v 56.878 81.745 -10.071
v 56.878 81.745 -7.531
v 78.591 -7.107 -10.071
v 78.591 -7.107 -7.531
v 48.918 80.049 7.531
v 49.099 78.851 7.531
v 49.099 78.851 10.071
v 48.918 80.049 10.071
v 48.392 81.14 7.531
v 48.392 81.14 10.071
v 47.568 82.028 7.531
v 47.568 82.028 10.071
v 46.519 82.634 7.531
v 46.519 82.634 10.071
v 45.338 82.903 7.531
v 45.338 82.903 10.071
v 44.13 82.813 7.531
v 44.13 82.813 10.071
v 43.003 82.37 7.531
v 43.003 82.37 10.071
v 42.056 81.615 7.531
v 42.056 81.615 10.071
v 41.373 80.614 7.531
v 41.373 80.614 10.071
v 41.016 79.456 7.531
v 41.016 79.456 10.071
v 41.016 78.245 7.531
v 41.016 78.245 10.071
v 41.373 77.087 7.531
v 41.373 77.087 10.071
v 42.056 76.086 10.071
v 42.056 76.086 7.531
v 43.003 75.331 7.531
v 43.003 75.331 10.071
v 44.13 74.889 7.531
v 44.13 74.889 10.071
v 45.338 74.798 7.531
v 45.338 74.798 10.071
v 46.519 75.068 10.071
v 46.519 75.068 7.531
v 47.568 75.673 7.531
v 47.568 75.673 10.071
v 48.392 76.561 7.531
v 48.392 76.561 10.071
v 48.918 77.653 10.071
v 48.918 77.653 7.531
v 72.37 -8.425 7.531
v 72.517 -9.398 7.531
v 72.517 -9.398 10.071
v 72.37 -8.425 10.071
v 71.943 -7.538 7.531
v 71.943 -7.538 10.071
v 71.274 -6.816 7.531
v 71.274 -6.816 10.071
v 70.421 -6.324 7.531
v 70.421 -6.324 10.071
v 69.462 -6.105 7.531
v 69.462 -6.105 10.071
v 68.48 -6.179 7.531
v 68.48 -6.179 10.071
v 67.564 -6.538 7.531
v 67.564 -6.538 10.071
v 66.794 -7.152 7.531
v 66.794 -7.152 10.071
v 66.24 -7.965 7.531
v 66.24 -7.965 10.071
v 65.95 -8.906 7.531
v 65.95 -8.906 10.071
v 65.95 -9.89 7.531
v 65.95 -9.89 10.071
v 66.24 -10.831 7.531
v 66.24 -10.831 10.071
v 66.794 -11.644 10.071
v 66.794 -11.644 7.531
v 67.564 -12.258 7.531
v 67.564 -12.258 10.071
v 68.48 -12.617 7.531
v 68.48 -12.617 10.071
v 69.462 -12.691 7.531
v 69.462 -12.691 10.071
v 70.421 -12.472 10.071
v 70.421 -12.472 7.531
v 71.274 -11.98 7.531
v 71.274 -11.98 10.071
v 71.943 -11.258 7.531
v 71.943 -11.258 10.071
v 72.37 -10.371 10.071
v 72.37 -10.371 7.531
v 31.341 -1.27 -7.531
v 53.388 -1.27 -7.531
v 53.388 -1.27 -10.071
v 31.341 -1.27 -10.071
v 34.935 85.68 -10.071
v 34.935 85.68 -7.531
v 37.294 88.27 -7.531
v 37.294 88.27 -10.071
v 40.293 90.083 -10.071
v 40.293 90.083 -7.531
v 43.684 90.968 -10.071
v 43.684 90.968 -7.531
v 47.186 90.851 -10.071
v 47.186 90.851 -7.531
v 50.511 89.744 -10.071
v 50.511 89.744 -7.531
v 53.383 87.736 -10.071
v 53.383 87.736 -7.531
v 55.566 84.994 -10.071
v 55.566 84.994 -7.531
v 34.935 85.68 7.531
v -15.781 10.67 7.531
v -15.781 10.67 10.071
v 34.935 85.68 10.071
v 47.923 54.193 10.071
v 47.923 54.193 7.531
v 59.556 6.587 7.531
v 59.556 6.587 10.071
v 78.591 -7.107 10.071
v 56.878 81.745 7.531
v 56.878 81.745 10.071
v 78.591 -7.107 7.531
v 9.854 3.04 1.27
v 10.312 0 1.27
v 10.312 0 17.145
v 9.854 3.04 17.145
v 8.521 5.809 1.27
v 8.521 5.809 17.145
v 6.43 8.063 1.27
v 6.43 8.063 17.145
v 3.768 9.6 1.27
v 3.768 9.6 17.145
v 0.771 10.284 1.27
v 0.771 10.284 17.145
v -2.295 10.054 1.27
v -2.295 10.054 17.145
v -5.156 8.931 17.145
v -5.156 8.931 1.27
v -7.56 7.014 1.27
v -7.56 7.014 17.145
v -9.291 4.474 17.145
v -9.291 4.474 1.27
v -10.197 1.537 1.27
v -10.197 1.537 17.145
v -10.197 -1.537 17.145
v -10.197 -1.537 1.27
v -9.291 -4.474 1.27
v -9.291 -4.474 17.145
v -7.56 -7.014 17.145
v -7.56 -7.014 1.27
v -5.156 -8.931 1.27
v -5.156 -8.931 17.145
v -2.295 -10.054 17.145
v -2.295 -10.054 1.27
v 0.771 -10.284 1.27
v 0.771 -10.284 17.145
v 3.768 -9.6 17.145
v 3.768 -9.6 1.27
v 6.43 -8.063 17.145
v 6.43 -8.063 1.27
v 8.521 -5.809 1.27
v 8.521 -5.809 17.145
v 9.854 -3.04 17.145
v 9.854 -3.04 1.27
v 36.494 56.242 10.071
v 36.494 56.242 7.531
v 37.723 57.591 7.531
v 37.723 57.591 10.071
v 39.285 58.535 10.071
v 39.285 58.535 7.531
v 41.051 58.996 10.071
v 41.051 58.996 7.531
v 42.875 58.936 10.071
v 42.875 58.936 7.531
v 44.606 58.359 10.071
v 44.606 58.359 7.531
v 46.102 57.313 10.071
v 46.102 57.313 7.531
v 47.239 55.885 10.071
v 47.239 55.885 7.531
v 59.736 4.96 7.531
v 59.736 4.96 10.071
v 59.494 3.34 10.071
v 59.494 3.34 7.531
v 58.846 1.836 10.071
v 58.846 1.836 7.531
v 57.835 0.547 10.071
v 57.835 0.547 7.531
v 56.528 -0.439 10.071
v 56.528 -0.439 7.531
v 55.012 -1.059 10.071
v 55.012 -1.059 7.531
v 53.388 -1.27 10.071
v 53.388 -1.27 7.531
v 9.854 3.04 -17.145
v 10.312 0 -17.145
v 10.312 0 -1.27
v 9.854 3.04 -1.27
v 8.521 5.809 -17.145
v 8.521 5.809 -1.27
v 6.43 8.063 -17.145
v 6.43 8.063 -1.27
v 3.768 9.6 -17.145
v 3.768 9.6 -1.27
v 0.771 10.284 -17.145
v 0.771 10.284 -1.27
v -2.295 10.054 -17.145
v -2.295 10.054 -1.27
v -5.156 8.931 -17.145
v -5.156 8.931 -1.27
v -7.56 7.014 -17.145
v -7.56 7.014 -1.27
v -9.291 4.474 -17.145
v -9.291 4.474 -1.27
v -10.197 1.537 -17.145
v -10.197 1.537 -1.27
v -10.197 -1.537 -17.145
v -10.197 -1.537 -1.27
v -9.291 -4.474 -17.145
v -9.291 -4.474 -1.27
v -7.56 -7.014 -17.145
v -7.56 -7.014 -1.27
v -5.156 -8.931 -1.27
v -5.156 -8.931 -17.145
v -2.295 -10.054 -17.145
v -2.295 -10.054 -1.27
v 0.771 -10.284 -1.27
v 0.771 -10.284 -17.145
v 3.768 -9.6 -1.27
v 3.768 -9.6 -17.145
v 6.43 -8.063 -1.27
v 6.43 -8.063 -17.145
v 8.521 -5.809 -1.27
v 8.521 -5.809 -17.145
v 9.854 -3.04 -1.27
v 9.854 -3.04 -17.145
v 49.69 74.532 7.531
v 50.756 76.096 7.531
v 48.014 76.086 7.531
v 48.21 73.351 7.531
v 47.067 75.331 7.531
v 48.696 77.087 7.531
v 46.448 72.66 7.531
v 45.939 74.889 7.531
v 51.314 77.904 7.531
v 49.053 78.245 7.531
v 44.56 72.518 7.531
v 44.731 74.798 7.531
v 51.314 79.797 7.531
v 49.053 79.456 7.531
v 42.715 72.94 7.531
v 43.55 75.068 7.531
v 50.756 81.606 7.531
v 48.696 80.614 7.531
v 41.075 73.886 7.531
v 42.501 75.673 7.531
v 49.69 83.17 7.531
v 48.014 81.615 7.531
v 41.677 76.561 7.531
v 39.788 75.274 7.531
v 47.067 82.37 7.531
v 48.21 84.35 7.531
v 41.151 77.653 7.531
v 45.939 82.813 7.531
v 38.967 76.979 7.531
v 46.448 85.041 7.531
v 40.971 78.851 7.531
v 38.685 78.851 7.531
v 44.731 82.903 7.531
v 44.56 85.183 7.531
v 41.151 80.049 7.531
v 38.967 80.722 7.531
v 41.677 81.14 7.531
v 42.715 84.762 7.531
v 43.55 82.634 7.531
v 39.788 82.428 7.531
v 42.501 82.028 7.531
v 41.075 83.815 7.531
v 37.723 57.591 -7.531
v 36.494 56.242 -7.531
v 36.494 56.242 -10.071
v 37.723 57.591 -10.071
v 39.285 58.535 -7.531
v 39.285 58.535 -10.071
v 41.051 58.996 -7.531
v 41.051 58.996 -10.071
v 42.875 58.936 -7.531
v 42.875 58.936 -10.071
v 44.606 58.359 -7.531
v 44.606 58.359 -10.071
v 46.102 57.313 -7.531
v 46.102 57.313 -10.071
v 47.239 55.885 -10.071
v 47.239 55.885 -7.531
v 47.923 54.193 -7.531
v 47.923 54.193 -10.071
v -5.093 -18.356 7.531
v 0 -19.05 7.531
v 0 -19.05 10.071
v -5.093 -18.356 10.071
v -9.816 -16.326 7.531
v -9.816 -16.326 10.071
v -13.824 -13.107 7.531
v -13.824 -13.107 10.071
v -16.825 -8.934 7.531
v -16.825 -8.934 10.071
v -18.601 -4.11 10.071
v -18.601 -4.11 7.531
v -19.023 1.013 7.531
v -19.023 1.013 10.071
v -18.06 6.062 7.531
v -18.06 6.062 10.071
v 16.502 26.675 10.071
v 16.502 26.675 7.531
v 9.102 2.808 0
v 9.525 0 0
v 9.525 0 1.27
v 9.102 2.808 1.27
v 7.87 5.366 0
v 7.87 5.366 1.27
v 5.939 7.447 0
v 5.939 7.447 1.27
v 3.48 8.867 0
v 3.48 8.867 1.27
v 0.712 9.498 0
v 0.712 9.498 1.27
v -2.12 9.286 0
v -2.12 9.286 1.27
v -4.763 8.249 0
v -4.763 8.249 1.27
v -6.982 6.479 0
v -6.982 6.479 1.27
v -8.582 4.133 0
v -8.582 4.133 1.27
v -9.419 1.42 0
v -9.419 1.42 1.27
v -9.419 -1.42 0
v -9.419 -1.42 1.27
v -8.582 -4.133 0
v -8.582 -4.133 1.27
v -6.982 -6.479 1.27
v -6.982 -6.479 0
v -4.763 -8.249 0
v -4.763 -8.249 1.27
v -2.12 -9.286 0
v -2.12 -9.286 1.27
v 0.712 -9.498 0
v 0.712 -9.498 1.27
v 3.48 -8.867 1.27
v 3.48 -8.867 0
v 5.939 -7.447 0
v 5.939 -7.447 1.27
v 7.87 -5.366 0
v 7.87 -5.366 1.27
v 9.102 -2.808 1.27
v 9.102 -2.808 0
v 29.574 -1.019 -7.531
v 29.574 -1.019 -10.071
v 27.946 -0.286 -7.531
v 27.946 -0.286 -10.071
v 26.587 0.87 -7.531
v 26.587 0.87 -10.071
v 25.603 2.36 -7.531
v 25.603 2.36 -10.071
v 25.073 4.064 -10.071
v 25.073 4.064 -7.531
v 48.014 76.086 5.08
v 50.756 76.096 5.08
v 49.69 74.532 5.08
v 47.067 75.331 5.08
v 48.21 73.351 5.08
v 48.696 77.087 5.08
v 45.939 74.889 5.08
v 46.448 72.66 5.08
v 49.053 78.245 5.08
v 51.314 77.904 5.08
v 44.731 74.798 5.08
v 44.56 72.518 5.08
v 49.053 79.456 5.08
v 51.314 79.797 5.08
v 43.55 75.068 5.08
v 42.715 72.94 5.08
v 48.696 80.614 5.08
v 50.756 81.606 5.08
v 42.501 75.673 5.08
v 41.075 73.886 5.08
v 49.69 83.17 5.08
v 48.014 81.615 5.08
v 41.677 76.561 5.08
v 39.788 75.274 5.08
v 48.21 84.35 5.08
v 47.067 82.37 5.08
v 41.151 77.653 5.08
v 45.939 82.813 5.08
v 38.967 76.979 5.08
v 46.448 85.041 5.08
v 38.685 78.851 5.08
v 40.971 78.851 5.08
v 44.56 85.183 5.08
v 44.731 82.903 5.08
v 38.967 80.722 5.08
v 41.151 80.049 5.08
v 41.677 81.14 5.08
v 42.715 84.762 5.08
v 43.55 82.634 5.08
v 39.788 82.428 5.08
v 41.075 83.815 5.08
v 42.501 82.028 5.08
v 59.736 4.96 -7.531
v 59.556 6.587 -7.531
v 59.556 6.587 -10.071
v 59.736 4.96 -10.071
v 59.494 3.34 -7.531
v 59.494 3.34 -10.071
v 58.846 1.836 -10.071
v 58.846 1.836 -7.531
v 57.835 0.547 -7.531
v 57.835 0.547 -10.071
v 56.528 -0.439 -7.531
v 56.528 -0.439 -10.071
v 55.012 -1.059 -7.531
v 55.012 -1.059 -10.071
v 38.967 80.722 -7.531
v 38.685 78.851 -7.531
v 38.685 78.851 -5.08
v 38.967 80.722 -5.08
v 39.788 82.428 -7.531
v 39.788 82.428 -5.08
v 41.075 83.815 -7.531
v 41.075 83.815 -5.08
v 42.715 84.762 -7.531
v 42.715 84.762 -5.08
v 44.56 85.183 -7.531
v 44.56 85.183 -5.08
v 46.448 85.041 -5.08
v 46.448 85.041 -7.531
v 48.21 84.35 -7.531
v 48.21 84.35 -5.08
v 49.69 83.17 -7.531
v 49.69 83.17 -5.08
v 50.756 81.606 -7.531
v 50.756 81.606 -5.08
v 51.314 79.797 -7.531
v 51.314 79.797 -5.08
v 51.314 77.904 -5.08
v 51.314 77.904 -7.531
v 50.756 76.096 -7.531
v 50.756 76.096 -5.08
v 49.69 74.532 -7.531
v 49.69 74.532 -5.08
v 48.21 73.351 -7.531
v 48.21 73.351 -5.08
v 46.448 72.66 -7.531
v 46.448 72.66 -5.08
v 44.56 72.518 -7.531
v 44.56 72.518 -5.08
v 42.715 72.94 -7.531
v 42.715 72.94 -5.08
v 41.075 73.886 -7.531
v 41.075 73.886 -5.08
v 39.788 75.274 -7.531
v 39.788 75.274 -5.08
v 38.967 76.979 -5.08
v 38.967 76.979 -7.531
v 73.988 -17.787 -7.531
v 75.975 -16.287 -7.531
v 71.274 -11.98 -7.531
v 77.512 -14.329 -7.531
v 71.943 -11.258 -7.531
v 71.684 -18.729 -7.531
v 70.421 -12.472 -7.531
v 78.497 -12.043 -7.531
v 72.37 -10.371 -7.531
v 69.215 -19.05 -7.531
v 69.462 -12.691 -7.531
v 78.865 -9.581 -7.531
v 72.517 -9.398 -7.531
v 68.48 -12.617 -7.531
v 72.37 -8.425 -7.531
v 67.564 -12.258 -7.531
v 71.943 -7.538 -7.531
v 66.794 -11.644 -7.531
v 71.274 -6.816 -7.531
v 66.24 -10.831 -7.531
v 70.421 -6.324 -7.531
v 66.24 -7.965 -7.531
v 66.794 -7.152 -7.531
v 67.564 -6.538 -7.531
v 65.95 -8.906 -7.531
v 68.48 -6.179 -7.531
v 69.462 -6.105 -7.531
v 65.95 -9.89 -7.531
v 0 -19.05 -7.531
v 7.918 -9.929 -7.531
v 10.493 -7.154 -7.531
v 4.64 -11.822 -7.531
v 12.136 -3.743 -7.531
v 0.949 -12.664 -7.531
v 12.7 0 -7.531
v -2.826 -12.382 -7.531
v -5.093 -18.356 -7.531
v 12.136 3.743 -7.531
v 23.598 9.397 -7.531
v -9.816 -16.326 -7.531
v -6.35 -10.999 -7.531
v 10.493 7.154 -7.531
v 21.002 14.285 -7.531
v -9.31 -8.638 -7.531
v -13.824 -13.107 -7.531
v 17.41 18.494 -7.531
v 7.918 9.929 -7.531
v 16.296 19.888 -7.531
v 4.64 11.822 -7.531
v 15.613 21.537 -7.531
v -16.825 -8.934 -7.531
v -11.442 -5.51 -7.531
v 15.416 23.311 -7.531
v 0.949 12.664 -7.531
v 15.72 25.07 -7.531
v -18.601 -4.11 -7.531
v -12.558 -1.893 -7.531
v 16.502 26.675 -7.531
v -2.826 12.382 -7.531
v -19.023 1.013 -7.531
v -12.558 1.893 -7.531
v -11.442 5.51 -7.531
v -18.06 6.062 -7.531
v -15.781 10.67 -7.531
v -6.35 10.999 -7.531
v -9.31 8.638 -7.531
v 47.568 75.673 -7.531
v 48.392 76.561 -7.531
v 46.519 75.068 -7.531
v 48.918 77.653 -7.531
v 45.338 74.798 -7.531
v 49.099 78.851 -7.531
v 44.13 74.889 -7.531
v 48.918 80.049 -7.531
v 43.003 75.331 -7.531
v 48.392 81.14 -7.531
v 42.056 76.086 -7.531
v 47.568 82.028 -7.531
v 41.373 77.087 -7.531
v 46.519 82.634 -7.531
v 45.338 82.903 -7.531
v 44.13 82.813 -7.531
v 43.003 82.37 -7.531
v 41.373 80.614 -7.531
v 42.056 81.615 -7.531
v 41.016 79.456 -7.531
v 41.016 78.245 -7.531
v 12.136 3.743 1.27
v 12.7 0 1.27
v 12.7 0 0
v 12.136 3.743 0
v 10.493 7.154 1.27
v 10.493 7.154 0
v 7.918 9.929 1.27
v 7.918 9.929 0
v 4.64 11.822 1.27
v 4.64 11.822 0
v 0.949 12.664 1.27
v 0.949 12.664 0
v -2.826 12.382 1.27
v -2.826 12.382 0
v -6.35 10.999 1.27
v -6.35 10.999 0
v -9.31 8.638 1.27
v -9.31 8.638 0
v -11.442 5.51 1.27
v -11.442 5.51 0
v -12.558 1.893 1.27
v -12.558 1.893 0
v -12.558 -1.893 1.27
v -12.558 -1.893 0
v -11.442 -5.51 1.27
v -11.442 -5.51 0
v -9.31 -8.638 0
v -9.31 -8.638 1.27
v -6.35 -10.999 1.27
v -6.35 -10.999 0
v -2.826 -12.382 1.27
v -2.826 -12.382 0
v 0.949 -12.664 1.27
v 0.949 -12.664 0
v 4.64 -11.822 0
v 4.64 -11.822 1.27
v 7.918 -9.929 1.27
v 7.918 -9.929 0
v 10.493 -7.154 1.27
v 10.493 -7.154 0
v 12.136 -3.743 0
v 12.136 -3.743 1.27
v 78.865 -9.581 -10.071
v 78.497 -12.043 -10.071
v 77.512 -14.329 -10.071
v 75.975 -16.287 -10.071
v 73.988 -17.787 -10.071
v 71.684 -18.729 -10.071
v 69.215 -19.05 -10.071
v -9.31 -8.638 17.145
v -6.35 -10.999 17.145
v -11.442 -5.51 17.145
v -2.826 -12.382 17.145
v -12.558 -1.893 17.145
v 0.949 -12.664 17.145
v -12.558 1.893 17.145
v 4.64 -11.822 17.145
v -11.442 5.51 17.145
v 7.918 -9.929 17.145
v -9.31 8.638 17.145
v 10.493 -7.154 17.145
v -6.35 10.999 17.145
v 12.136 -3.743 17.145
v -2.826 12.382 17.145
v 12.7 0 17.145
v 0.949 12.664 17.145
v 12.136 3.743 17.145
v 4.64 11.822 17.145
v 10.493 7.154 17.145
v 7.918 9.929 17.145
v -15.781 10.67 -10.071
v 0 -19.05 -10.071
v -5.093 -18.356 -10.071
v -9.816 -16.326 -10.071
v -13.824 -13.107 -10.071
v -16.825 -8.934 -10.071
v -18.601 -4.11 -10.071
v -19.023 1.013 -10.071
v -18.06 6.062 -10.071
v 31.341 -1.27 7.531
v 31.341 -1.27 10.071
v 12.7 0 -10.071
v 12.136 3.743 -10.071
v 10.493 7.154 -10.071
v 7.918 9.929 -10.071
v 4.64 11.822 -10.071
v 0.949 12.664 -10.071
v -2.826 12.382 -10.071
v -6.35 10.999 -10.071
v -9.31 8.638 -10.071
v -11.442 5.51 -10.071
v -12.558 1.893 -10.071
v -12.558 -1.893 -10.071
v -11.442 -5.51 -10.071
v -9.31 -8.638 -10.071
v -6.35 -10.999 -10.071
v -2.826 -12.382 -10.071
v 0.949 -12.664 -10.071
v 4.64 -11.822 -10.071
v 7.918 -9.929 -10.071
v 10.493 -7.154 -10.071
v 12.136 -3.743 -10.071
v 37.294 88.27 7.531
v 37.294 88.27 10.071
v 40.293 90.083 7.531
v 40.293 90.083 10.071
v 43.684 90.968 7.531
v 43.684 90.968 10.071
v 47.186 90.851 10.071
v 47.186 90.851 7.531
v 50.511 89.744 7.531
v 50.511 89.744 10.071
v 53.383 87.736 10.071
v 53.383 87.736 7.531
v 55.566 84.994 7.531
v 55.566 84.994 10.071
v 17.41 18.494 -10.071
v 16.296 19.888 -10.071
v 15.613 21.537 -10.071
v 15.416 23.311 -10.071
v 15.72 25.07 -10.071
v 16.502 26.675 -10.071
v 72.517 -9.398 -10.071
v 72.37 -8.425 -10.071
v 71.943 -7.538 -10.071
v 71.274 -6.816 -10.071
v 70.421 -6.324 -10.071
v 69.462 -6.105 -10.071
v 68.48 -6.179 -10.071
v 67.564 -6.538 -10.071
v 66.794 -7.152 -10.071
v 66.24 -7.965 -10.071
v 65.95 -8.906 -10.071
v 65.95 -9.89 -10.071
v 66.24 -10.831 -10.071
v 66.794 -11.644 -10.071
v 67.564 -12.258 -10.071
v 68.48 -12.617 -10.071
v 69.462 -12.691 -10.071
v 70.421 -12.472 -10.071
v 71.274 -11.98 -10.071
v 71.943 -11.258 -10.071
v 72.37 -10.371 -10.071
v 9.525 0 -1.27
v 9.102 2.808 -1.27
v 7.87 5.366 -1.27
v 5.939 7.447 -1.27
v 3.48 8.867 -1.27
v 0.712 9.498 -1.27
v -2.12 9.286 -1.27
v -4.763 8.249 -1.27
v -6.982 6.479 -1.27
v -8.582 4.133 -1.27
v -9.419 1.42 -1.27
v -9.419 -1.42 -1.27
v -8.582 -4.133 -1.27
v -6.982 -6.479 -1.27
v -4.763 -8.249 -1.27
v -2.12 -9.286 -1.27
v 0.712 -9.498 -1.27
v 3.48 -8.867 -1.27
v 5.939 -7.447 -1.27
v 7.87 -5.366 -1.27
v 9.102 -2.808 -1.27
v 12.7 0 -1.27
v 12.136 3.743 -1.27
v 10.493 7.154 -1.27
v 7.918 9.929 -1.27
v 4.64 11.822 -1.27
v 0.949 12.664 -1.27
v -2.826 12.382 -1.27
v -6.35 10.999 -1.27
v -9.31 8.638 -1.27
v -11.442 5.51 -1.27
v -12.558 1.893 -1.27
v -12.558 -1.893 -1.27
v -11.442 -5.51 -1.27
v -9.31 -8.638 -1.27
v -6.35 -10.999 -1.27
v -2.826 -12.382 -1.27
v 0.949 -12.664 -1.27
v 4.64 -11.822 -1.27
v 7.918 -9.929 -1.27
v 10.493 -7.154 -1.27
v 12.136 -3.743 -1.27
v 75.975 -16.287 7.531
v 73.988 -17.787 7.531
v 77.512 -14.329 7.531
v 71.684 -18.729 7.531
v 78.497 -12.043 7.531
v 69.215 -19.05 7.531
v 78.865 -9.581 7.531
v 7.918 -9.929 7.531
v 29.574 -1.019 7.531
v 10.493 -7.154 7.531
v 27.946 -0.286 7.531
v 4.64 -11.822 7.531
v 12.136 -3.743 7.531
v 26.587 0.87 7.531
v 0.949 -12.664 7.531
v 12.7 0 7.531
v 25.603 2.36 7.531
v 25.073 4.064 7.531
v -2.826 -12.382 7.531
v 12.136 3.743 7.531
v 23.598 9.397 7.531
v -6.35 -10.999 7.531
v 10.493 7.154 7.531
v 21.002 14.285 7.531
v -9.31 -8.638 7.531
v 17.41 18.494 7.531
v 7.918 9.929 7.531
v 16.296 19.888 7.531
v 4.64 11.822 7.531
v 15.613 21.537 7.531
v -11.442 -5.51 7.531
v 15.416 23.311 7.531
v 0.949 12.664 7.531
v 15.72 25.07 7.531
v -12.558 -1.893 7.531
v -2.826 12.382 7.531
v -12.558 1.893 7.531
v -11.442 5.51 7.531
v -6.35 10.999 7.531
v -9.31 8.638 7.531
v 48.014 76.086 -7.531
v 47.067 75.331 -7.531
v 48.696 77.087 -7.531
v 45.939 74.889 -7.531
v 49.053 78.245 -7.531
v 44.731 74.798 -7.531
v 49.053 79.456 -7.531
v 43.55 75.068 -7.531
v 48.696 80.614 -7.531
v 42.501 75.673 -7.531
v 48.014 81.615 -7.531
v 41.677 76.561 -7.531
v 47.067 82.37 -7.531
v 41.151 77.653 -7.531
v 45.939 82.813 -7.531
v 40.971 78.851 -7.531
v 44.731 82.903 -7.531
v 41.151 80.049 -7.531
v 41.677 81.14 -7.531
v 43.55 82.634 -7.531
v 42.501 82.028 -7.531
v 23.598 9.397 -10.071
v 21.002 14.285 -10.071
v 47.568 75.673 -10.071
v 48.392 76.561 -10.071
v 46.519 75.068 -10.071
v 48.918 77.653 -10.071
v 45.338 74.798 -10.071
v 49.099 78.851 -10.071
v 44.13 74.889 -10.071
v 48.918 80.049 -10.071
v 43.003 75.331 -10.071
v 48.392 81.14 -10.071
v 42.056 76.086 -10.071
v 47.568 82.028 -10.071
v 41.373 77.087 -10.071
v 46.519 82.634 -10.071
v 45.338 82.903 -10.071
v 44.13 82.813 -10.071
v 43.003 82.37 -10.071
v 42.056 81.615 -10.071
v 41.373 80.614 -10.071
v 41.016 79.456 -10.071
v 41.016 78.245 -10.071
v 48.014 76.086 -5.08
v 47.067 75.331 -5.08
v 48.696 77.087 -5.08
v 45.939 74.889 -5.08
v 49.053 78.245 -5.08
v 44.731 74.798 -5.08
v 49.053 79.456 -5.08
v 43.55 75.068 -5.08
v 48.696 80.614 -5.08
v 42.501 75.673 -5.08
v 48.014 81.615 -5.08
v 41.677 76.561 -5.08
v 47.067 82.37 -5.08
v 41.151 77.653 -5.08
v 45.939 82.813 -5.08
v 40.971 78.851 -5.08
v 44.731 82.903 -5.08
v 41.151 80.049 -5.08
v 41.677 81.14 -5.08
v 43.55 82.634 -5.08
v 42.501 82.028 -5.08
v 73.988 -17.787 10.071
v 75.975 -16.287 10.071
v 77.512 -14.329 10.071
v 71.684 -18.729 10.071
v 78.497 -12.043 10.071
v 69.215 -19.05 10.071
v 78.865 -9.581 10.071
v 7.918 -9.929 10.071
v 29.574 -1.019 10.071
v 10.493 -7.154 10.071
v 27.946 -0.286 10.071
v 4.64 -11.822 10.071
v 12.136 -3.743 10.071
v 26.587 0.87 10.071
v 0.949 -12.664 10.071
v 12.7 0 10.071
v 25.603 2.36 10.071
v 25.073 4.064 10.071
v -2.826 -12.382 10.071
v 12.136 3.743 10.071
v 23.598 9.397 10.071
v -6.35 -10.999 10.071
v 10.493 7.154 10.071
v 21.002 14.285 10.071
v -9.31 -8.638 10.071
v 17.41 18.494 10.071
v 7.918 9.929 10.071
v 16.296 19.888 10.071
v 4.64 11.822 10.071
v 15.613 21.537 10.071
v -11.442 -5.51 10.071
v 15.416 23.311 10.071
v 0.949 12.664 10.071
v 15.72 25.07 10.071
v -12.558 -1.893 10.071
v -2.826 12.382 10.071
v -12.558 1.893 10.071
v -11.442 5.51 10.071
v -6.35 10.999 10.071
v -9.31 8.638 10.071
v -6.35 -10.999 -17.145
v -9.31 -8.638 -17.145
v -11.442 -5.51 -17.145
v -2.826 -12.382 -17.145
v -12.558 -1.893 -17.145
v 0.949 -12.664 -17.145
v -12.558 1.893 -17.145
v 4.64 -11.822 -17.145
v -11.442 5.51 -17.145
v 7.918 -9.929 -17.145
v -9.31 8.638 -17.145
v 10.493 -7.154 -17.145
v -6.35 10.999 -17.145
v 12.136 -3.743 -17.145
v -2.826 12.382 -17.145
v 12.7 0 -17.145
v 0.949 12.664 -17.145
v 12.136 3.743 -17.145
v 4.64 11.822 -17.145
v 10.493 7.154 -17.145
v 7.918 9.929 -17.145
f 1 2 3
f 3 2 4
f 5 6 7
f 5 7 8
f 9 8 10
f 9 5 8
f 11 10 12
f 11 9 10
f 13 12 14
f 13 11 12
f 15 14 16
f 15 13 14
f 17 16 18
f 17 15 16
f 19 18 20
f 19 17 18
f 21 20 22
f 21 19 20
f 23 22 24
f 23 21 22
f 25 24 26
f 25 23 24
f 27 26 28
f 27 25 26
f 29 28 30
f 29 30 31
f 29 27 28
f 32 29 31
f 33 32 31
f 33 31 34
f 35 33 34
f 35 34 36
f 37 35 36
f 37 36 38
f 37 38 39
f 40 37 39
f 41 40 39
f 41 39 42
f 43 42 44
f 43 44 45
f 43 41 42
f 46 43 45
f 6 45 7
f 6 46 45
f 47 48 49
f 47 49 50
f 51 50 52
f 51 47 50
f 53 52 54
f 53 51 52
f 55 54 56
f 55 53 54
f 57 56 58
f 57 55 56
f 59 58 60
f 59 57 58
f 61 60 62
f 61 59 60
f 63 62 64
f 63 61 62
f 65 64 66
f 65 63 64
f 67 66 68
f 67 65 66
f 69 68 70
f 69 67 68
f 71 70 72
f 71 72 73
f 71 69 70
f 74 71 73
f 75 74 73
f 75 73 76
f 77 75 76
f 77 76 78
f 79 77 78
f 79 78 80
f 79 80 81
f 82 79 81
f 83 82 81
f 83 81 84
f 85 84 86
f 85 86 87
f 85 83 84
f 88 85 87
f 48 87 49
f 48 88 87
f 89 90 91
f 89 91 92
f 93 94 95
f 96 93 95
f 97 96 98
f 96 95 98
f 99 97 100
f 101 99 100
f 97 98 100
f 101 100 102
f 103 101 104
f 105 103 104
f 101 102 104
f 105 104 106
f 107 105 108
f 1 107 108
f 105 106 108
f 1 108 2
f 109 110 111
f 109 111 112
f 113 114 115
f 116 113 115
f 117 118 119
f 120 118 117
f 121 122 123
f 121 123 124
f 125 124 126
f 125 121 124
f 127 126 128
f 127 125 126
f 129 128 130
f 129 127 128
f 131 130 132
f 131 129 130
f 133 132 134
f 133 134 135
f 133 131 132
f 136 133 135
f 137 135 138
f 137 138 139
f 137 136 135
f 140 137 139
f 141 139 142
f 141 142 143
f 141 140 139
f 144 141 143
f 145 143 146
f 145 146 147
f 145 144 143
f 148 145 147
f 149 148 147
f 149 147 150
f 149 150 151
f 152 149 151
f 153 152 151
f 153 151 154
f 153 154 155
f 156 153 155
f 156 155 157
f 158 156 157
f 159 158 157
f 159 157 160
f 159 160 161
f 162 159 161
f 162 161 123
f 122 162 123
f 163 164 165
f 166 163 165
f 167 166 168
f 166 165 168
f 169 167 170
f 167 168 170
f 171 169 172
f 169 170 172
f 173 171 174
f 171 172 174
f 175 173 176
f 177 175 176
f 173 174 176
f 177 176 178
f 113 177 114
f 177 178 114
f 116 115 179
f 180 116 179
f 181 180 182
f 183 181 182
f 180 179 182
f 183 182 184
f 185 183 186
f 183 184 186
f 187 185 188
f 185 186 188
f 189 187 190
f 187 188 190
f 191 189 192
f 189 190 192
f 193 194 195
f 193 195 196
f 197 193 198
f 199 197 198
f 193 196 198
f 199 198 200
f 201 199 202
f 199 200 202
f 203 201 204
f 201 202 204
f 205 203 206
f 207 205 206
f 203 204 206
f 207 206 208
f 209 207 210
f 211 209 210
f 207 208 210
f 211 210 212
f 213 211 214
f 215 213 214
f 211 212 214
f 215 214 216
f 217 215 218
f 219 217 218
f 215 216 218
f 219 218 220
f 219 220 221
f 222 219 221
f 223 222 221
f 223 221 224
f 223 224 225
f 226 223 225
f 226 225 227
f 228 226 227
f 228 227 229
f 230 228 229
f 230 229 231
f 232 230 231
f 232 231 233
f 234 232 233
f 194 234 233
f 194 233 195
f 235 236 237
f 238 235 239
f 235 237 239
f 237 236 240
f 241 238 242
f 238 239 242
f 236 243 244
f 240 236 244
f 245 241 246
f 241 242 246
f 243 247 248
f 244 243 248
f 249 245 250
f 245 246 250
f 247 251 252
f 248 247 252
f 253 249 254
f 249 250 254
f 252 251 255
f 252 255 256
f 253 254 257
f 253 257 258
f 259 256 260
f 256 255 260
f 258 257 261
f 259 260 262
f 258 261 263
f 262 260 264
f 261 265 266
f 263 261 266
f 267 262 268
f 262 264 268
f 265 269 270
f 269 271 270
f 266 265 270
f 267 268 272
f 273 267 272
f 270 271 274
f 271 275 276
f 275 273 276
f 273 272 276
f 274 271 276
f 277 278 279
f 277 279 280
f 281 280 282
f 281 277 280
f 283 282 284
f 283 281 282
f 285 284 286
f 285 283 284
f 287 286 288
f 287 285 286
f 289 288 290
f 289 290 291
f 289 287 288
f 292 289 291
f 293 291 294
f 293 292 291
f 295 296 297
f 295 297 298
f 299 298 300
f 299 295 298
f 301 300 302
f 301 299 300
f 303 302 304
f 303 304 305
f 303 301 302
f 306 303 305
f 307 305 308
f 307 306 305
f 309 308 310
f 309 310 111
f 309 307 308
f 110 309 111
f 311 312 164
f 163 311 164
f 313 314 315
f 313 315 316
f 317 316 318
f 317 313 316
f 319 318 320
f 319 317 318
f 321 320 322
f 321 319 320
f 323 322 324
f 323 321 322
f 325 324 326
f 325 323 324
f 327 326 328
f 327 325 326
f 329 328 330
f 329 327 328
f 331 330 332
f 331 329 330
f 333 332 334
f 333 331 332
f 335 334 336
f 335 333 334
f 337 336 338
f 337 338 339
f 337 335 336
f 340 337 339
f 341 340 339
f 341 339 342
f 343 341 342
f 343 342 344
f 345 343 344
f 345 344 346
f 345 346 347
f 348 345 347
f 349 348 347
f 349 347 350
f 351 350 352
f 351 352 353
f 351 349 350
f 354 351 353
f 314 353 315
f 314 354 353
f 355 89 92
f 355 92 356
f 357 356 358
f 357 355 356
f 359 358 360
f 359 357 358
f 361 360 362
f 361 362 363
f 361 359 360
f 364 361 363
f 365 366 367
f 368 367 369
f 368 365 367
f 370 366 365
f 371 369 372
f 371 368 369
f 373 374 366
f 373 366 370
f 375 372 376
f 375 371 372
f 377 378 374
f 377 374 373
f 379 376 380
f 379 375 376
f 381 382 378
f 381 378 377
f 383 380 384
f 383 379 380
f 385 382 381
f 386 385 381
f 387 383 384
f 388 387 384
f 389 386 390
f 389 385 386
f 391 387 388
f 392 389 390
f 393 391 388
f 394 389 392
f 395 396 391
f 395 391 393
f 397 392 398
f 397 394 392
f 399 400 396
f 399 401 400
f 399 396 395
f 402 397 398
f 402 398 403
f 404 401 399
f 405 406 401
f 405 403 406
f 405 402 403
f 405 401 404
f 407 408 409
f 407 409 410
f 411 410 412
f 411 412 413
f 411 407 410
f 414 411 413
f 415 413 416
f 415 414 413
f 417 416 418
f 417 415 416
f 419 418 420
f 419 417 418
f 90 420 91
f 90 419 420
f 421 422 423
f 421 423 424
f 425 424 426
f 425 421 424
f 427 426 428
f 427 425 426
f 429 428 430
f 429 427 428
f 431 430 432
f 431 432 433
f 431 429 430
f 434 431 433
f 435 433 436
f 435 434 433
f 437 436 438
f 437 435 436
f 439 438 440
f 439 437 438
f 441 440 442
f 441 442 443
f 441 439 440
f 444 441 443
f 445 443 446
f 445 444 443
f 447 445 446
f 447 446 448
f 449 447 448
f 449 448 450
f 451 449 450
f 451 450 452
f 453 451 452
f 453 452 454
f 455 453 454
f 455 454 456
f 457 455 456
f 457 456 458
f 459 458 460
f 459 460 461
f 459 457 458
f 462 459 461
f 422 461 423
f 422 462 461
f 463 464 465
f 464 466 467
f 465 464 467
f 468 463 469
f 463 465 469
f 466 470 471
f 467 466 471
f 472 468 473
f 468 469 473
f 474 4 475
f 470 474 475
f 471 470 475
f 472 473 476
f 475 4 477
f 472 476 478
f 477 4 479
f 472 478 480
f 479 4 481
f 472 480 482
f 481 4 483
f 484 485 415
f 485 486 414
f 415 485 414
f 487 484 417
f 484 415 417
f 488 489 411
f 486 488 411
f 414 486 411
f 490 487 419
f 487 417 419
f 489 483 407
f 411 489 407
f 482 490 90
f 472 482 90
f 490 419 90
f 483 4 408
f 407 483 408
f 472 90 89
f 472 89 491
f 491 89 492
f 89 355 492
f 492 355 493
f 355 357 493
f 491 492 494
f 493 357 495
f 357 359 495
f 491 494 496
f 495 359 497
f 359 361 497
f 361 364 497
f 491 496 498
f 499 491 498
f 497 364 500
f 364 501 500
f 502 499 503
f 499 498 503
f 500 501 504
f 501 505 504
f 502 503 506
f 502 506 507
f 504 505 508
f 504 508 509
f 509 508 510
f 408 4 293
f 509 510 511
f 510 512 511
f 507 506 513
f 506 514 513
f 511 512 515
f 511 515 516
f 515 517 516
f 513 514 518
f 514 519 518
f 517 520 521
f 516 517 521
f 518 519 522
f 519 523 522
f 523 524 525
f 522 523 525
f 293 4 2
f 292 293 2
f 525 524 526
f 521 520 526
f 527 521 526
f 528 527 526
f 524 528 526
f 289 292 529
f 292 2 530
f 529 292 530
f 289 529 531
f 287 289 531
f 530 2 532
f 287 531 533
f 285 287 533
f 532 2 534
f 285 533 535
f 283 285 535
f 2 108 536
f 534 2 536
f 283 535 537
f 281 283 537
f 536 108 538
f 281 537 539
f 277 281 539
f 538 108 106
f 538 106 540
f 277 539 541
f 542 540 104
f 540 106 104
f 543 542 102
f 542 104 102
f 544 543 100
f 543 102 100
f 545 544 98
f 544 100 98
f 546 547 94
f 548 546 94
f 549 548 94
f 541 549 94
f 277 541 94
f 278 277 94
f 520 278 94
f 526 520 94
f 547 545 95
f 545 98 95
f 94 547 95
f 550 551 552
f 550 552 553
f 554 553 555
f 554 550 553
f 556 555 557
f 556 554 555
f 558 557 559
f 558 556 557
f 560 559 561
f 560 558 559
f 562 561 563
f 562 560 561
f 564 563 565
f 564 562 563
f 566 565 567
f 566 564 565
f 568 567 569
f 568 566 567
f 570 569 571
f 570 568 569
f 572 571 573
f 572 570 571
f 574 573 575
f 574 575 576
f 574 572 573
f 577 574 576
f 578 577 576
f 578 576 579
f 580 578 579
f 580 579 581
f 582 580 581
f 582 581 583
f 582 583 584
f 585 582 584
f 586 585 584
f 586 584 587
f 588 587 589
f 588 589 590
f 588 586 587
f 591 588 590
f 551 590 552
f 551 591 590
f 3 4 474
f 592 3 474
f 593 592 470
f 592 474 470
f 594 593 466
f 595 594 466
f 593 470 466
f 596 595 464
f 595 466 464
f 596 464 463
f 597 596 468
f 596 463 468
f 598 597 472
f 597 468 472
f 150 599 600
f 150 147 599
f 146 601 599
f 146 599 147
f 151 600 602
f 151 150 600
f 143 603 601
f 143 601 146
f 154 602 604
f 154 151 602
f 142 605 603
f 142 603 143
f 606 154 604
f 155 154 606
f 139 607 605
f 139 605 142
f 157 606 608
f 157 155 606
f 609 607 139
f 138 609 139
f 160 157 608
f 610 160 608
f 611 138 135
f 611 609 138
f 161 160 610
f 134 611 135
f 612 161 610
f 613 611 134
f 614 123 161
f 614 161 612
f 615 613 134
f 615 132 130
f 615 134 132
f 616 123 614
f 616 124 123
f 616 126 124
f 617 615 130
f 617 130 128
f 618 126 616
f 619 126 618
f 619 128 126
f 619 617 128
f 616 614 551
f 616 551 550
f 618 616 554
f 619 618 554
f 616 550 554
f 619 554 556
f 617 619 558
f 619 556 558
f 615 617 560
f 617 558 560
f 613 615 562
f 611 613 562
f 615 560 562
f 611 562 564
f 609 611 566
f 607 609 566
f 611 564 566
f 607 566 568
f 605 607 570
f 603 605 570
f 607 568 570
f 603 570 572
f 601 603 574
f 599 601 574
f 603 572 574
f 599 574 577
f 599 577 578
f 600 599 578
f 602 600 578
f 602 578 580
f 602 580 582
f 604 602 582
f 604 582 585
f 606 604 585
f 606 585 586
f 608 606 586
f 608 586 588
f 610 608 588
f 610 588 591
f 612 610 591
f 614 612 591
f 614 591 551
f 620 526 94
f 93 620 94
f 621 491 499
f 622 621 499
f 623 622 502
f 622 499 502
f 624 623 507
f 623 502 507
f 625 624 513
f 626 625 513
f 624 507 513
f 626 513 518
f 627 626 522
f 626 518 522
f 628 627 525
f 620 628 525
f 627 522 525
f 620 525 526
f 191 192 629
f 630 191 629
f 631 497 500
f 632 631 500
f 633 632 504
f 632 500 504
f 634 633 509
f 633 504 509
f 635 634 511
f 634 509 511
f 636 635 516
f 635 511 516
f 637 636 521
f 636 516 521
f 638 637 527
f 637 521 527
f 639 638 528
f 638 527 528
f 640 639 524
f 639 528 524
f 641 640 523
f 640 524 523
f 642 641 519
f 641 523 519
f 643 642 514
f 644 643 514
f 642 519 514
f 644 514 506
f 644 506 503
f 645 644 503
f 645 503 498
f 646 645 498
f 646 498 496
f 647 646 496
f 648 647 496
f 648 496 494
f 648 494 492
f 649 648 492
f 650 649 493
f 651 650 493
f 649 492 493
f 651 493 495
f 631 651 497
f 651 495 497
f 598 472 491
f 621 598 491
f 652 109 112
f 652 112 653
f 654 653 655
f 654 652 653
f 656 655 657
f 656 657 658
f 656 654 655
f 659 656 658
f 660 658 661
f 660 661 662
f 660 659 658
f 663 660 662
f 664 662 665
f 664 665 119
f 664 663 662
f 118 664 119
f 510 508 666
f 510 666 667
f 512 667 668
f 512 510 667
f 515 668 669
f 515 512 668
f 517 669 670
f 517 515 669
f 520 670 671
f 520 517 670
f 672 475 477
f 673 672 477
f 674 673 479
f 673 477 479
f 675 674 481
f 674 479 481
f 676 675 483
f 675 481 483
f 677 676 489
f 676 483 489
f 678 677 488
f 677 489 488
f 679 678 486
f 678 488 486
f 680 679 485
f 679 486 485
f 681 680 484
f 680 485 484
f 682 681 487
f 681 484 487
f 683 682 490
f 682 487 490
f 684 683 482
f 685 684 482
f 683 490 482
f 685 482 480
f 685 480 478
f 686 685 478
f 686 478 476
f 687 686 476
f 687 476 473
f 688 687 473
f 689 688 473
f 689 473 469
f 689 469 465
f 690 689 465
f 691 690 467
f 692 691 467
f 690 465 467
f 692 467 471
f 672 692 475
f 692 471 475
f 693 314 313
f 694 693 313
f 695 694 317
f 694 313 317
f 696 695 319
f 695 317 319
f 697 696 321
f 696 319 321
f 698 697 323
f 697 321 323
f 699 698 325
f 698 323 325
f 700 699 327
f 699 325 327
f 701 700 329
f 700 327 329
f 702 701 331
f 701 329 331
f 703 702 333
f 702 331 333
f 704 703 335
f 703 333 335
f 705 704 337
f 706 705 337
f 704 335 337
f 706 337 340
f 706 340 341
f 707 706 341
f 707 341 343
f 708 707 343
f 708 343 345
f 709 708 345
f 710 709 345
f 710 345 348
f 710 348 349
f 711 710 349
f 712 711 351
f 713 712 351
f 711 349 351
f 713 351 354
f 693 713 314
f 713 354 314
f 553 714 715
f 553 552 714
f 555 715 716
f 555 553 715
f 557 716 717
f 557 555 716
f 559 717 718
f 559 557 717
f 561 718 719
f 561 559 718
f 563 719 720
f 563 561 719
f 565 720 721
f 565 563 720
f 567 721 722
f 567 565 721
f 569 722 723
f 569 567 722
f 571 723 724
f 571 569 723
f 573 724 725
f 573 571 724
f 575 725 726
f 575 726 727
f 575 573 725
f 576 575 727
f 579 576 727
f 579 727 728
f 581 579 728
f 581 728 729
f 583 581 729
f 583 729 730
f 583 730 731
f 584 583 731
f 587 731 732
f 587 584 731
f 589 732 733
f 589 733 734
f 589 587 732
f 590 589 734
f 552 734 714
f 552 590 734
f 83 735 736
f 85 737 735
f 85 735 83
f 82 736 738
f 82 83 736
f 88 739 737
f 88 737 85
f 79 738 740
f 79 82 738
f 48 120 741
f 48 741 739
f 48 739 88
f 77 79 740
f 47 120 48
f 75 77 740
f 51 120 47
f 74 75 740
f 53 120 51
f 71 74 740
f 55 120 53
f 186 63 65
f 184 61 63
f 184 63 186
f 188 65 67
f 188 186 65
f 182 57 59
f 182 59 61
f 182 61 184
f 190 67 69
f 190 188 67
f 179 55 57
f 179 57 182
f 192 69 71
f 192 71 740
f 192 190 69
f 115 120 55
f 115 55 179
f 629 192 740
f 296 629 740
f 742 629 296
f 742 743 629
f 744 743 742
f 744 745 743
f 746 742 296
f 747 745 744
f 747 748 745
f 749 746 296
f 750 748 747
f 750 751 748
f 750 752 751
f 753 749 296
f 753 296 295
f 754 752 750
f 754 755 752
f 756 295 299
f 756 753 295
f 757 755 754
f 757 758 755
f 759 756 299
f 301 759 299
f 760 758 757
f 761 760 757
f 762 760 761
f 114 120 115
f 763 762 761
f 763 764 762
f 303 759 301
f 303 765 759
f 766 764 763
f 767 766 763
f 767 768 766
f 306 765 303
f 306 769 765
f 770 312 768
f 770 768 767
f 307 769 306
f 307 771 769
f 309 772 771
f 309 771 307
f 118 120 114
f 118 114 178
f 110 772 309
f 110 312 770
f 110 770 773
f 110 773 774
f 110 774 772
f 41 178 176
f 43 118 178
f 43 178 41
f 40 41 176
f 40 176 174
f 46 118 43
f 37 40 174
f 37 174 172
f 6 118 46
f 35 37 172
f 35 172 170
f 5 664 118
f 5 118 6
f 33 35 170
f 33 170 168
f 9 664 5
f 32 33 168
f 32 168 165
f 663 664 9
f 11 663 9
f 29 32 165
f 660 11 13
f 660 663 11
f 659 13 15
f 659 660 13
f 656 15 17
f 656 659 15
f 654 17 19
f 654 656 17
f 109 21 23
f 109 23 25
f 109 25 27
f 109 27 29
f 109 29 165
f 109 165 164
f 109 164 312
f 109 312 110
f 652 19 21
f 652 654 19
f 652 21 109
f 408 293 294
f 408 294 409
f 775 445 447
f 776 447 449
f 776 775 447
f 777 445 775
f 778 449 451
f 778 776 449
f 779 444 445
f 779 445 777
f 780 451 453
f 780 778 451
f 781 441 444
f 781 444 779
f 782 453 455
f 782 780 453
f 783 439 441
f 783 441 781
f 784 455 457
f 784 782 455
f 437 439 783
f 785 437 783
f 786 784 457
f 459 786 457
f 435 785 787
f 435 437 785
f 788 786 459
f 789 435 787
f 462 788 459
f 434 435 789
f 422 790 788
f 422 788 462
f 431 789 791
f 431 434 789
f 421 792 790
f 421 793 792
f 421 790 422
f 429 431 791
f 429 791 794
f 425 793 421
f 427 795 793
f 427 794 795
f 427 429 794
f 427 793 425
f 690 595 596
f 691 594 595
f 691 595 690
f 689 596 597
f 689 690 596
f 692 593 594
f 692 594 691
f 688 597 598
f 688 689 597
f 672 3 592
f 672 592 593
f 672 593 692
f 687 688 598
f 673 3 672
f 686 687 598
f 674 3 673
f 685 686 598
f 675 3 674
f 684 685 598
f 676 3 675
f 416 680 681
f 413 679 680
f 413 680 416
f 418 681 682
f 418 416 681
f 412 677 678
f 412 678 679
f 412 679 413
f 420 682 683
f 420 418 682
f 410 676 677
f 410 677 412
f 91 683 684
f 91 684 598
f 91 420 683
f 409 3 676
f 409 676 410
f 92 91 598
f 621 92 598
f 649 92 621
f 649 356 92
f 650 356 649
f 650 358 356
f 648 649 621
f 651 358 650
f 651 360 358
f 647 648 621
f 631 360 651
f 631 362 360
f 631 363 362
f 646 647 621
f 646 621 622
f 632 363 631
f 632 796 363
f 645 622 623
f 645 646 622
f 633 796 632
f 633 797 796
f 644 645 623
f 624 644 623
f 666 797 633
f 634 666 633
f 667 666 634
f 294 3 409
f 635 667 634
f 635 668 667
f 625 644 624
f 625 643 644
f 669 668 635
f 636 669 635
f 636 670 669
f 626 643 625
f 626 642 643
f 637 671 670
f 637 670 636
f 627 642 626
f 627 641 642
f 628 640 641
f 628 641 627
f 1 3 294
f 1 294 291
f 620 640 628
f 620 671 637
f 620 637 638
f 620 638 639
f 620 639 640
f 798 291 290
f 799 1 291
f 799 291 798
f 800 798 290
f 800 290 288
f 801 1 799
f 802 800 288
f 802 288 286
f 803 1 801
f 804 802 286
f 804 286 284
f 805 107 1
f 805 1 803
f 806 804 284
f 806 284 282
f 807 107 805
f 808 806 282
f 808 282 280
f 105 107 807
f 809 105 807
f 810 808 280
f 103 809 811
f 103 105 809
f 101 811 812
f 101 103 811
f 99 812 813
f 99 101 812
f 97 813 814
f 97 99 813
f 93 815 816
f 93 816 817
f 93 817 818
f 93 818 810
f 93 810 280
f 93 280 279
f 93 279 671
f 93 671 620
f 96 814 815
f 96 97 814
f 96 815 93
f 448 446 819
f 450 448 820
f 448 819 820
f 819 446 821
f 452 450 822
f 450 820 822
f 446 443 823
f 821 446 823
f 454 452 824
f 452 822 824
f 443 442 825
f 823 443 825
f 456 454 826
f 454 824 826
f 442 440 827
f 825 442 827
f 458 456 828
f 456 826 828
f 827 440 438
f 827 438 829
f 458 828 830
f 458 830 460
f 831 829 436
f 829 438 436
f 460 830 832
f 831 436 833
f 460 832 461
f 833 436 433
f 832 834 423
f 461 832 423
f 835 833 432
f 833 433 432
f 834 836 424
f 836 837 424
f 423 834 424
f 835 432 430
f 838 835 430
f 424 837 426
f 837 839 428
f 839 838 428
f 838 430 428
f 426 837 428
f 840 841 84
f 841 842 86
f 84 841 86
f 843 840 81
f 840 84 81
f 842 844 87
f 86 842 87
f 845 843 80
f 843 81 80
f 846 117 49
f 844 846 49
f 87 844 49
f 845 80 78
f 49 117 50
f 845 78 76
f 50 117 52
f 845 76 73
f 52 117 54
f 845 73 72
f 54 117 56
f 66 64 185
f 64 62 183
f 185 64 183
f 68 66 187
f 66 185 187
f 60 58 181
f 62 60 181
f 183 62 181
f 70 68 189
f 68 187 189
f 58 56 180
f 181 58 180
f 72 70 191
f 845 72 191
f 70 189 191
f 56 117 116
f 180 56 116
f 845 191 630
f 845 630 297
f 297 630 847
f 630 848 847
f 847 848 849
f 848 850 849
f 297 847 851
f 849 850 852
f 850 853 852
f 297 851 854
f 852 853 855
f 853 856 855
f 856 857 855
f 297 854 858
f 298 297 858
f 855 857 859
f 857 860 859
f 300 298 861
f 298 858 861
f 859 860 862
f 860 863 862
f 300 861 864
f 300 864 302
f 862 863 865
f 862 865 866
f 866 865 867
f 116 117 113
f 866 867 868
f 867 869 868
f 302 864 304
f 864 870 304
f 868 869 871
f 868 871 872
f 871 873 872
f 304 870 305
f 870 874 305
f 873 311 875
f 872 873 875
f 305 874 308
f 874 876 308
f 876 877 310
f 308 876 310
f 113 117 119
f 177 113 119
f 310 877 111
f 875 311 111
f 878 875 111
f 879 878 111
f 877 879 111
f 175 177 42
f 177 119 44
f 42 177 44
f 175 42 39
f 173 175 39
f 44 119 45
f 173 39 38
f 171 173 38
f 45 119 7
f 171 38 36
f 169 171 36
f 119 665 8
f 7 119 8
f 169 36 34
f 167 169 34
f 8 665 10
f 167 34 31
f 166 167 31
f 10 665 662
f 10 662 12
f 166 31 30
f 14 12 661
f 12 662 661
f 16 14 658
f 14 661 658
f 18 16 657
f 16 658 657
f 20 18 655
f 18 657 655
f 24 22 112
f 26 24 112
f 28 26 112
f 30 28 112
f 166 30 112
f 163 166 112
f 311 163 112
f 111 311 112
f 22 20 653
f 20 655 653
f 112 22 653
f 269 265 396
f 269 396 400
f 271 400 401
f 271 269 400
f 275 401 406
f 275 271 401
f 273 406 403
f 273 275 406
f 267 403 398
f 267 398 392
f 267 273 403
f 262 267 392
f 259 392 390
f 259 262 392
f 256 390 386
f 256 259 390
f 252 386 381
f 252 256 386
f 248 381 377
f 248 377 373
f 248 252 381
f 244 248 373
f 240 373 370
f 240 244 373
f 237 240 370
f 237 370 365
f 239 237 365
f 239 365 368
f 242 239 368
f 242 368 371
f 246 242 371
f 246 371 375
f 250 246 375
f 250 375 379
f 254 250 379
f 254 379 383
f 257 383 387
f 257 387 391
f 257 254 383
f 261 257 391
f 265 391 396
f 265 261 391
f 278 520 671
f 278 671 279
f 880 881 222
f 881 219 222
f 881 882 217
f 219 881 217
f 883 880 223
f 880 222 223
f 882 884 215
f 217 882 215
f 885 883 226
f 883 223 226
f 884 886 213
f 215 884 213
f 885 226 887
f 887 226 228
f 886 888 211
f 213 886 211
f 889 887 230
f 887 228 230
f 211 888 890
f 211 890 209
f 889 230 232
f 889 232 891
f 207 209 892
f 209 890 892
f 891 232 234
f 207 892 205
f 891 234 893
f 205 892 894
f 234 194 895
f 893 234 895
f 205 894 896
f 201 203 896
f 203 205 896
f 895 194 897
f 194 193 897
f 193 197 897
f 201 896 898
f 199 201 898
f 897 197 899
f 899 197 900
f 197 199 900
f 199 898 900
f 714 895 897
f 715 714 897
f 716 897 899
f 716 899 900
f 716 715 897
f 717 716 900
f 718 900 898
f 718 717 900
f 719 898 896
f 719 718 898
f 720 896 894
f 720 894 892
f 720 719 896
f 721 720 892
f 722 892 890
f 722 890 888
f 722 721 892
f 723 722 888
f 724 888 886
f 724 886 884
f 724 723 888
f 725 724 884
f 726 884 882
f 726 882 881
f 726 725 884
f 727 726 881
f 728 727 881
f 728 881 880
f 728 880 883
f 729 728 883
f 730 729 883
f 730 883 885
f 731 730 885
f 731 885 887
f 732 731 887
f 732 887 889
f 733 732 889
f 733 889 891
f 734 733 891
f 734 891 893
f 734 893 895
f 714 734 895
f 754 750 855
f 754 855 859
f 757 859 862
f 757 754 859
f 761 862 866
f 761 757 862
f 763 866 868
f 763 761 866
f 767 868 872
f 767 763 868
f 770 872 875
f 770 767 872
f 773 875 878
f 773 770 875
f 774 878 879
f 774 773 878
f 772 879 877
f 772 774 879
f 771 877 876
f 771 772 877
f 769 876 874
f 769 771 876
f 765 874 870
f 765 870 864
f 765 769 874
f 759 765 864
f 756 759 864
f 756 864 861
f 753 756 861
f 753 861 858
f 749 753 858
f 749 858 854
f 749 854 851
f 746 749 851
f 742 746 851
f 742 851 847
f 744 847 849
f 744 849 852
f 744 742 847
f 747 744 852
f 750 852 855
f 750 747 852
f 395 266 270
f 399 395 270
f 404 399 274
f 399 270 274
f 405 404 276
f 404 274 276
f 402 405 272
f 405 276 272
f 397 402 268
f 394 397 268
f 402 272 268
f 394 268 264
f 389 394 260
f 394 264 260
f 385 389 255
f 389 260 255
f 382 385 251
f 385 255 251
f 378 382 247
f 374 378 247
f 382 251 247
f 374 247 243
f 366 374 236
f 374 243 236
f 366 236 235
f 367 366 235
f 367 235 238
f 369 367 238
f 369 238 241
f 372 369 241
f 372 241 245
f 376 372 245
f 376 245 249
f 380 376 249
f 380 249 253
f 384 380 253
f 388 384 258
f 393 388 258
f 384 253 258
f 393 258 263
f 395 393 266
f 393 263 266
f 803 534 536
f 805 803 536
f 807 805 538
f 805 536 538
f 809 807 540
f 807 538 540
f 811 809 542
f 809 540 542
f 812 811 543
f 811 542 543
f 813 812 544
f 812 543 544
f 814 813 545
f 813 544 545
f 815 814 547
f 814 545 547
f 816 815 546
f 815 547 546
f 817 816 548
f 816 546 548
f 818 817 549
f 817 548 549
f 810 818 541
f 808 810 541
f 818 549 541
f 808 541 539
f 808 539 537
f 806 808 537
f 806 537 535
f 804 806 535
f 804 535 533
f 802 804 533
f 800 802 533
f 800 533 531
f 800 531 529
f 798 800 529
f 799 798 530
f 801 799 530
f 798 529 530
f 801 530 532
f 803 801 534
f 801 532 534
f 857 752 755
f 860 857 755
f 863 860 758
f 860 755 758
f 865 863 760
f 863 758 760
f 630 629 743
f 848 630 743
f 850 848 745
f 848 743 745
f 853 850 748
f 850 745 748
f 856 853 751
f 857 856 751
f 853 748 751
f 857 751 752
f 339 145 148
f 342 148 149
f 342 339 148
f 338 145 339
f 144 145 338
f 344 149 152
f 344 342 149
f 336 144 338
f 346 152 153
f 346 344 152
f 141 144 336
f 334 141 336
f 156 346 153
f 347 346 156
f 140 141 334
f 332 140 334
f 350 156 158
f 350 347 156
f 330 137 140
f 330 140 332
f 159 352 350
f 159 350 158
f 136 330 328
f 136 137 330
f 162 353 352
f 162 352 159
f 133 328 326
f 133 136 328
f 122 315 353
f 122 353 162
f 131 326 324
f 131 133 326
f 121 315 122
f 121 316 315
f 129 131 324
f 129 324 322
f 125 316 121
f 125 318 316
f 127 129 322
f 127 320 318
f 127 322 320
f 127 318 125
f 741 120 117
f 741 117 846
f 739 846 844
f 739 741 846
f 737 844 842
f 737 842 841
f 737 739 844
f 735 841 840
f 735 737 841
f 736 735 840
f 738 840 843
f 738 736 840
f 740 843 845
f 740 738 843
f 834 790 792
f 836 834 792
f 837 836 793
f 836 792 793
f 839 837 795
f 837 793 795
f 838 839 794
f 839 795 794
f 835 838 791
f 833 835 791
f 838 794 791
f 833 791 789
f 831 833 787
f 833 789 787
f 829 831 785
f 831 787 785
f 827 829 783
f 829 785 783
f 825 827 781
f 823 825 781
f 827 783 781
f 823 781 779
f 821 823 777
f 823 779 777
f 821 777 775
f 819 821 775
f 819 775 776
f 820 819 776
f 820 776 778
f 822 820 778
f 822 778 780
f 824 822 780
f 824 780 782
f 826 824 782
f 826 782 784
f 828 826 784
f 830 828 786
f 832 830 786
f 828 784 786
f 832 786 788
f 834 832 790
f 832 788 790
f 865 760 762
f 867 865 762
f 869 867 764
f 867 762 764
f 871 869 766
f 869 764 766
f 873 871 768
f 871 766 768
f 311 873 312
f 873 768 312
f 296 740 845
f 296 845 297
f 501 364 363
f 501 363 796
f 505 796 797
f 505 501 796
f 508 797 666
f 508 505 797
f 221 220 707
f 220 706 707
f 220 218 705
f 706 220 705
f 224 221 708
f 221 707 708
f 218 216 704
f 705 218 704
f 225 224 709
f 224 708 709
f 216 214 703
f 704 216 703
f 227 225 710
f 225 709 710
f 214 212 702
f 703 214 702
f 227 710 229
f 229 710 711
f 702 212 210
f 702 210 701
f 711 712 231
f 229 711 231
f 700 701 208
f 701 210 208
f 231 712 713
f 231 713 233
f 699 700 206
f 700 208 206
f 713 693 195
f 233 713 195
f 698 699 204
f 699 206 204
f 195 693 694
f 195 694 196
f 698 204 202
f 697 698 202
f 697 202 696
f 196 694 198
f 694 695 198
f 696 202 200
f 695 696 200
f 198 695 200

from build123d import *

# Parameters (mm, degrees)
BEARING_BACK_STOP_DEPTH      = 1.27
BEARING_BACK_STOP_DEPTH_BACK = 1.27
SKETCH3_R                    = 12.7
SKETCH3_R_2                  = 9.525
BEARING_MOUNT_DEPTH          = 17.145
BEARING_MOUNT_DEPTH_BACK     = 17.145
SKETCH1_R                    = 12.7
SKETCH1_R_2                  = 10.3124
BELLCRANK_START              = 7.5311
SKETCH4_R                    = 4.064
SKETCH4_R_2                  = 3.302
SKETCH4_R_3                  = 12.7
BELLCRANK_PLATE_DEPTH        = 2.54
SKETCH5_R                    = 6.35
SKETCH5_R_2                  = 4.064
DAMPER_WASHER_DEPTH          = 2.4511


with BuildPart() as part:
    # Sketch3 → Bearing Back Stop (new, two sides: drawn at the far end of the back side and taken through both)
    with BuildSketch(Plane.XY.offset(-BEARING_BACK_STOP_DEPTH_BACK)):
        Circle(SKETCH3_R)
        Circle(SKETCH3_R_2, mode=Mode.SUBTRACT)
    extrude(amount=BEARING_BACK_STOP_DEPTH + BEARING_BACK_STOP_DEPTH_BACK)

    # Sketch1 → Bearing Mount (add, two sides: drawn at the far end of the back side and taken through both)
    with BuildSketch(Plane.XY.offset(-BEARING_MOUNT_DEPTH_BACK)):
        Circle(SKETCH1_R)
        Circle(SKETCH1_R_2, mode=Mode.SUBTRACT)
    extrude(amount=BEARING_MOUNT_DEPTH + BEARING_MOUNT_DEPTH_BACK)


with BuildPart() as body_2:
    # Sketch4 → Bellcrank Plate (new body)
    with BuildSketch(Plane.XY.offset(BELLCRANK_START)):
        with BuildLine():
            Line((-15.781313692, 10.67017517), (34.934592494, 85.679592718))
            ThreePointArc((34.934592494, 85.679592718), (47.186460576, 90.851284893), (56.878127765, 81.744899299))
            Line((56.878127765, 81.744899299), (78.590983305, -7.106743537))
            ThreePointArc((78.590983305, -7.106743537), (76.806863181, -15.358113112), (69.214883486, -19.05))
            Line((69.214883486, -19.05), (0, -19.05))
            ThreePointArc((0, -19.05), (-16.825120163, -8.934082578), (-15.781313692, 10.67017517))
        make_face()
        with Locations((45.034633256, 78.850680609)):
            Circle(SKETCH4_R, mode=Mode.SUBTRACT)
        with Locations((69.214883486, -9.398)):
            Circle(SKETCH4_R_2, mode=Mode.SUBTRACT)
        Circle(SKETCH4_R_3, mode=Mode.SUBTRACT)
        with BuildLine():
            Line((53.387578963, -1.27), (31.340965205, -1.27))
            ThreePointArc((31.340965205, -1.27), (27.225694862, 0.243984078), (25.072772164, 4.064))
            ThreePointArc((25.072772164, 4.064), (22.433493551, 11.912110103), (17.41029553, 18.494366968))
            ThreePointArc((17.41029553, 18.494366968), (15.451617983, 22.417526417), (16.502431515, 26.674683767))
            Line((16.502431515, 26.674683767), (36.493731583, 56.242050042))
            ThreePointArc((36.493731583, 56.242050042), (42.874912876, 58.935639716), (47.922656203, 54.192730553))
            Line((47.922656203, 54.192730553), (59.556065687, 6.587405568))
            ThreePointArc((59.556065687, 6.587405568), (58.382302447, 1.158872953), (53.387578963, -1.27))
        make_face(mode=Mode.SUBTRACT)
    extrude(amount=BELLCRANK_PLATE_DEPTH)


with BuildPart() as body_3:
    # Sketch5 → Damper Washer (new body)
    with BuildSketch(Plane(origin=(0, 0, 7.5311), x_dir=(-1, 0, 0), z_dir=(0, 0, -1))):
        with Locations((-45.034633256, 78.850680609)):
            Circle(SKETCH5_R)
        with Locations((-45.034633256, 78.850680609)):
            Circle(SKETCH5_R_2, mode=Mode.SUBTRACT)
    extrude(amount=DAMPER_WASHER_DEPTH)


with BuildPart() as body_4:
    # Bellcrank Mirror: mirrored copy
    add(body_2.part.mirror(Plane.XY))


with BuildPart() as body_5:
    # Bellcrank Mirror 2: mirrored copy
    add(body_3.part.mirror(Plane.XY))


solid = Compound([part.part, body_2.part, body_3.part, body_4.part, body_5.part])
